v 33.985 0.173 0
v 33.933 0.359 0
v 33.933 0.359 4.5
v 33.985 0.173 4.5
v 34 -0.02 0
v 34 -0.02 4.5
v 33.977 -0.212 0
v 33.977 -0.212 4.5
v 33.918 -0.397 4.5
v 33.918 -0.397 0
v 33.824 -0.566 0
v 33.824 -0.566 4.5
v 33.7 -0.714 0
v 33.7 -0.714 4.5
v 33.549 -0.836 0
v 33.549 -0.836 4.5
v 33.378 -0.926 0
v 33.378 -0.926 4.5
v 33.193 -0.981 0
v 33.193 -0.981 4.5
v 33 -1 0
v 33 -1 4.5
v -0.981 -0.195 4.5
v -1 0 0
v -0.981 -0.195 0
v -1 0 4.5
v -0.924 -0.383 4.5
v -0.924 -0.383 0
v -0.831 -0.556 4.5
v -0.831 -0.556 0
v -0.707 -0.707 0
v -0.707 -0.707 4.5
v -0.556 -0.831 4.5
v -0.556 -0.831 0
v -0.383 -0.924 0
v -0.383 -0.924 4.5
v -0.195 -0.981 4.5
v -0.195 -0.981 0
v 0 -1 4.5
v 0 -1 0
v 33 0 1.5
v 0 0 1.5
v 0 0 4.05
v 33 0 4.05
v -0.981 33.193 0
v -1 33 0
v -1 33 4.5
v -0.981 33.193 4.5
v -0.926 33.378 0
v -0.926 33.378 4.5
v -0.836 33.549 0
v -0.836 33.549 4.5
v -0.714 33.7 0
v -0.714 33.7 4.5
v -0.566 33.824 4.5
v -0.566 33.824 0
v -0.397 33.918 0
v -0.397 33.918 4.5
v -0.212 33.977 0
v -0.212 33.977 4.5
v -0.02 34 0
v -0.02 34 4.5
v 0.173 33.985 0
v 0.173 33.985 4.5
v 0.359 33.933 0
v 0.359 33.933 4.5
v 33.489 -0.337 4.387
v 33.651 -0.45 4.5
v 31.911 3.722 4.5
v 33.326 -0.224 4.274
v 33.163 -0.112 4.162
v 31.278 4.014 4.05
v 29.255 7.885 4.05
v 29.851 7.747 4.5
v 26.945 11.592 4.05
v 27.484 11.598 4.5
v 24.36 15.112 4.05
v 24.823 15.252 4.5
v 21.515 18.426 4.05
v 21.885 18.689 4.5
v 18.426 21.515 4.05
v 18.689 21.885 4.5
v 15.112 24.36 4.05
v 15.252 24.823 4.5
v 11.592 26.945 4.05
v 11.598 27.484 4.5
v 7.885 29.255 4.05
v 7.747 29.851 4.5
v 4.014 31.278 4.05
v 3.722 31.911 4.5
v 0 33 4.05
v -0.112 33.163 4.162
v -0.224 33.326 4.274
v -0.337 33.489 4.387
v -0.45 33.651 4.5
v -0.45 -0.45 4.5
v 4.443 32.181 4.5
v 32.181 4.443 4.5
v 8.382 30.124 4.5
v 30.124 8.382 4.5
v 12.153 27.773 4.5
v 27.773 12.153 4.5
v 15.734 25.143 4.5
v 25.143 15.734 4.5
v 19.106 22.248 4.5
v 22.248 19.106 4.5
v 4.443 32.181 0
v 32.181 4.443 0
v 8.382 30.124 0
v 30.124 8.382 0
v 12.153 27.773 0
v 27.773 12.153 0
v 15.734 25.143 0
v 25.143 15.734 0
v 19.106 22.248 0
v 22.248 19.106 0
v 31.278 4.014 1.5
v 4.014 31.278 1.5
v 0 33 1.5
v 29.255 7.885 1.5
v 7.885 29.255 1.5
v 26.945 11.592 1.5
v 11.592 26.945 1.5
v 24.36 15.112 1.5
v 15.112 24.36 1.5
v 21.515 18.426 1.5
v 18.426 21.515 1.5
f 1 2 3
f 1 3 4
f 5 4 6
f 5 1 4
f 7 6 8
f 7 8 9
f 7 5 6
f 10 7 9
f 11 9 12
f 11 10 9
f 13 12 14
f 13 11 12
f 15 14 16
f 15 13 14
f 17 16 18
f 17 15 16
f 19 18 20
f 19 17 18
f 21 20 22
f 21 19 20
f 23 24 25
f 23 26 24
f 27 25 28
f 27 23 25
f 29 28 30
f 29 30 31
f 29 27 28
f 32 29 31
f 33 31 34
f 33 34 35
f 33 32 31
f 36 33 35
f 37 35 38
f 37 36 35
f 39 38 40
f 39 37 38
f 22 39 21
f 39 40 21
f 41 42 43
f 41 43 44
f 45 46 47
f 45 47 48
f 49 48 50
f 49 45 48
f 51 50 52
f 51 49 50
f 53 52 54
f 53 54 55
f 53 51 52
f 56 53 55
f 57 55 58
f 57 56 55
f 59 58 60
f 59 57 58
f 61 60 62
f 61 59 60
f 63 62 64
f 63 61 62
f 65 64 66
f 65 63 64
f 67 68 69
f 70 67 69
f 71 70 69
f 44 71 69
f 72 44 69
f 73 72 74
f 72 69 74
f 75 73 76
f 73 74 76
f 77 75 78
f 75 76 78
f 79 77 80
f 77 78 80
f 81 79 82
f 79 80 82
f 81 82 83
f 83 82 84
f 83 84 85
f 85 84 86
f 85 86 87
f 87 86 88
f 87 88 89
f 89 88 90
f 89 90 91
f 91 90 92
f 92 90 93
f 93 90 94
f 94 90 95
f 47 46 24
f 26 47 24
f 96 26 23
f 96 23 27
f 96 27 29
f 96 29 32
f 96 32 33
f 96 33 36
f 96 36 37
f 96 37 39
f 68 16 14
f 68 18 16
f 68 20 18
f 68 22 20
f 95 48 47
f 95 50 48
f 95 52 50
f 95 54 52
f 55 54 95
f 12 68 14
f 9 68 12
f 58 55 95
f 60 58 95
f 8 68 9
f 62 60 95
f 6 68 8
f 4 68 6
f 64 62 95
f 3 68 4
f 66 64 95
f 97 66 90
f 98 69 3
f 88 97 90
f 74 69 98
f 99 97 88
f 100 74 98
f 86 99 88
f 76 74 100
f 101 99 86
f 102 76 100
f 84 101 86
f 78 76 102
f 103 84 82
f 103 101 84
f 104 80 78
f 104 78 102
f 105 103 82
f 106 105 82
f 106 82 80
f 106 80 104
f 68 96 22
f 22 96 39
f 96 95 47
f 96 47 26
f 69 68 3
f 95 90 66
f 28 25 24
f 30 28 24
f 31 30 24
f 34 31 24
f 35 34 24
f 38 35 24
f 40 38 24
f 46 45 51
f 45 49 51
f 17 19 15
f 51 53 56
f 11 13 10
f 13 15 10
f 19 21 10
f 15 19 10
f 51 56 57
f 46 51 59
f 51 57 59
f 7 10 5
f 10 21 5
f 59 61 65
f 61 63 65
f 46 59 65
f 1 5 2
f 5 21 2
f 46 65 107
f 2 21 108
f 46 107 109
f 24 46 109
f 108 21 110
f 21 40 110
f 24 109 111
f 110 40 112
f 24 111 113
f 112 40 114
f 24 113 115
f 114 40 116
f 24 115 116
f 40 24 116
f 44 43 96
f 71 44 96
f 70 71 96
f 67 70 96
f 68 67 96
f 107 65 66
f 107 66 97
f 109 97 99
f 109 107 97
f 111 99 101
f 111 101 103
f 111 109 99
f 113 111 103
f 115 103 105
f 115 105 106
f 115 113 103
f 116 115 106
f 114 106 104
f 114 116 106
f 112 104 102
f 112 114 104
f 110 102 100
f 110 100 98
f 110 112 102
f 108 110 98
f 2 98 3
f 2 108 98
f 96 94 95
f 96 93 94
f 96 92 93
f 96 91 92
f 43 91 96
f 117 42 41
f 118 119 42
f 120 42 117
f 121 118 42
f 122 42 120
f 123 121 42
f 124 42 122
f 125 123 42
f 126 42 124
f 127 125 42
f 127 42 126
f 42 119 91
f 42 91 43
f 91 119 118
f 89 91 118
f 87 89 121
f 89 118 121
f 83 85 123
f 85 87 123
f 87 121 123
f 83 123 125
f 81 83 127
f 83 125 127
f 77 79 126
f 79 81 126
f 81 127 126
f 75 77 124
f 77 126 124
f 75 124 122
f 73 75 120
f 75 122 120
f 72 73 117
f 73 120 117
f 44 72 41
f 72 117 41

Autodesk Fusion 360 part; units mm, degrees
sketch "Sketch1" plane through (0, 0, 0) normal (0, 0, 1) x (1, 0, 0)
sketch "Sketch2" plane through (0, 0, 0) normal (0, 0, 1) x (1, 0, 0)
  line L0 (0, 0) -> (33, 0)
  line L1 (33, 0) -> (33, 33)
  line L2 (33, 33) -> (0, 33)
  line L3 (0, 33) -> (0, 0)
  arc A0 (33, 0) -> (0, 33) centre (-20.6429, -20.6429) ccw
  dimension "d1" = 33
  dimension "d2" = 33
extrude "Extrude1" add sketch "Sketch2" along normal blind 4.5 contours L0 L3 A0
move_face "OffsetFaces1" offset 1 3 faces at (11, 0, 1.5) (0, 22, 1.5) (21.8433, 18.069, 3)
extrude "Extrude2" cut sketch "Sketch2" along normal blind 3 from surface at 1.5 contours L0 L3 A0
fillet "Fillet1" radius 1 3 edges at (-1, -1, 2.25) (34.4371, -1, 2.25) (-1, 34.4371, 2.25)
chamfer "Chamfer1" distance 0.45 angle 45 3 edges at (0, 16.5, 4.5) (20, 20, 4.5) (16.5, 0, 4.5)
